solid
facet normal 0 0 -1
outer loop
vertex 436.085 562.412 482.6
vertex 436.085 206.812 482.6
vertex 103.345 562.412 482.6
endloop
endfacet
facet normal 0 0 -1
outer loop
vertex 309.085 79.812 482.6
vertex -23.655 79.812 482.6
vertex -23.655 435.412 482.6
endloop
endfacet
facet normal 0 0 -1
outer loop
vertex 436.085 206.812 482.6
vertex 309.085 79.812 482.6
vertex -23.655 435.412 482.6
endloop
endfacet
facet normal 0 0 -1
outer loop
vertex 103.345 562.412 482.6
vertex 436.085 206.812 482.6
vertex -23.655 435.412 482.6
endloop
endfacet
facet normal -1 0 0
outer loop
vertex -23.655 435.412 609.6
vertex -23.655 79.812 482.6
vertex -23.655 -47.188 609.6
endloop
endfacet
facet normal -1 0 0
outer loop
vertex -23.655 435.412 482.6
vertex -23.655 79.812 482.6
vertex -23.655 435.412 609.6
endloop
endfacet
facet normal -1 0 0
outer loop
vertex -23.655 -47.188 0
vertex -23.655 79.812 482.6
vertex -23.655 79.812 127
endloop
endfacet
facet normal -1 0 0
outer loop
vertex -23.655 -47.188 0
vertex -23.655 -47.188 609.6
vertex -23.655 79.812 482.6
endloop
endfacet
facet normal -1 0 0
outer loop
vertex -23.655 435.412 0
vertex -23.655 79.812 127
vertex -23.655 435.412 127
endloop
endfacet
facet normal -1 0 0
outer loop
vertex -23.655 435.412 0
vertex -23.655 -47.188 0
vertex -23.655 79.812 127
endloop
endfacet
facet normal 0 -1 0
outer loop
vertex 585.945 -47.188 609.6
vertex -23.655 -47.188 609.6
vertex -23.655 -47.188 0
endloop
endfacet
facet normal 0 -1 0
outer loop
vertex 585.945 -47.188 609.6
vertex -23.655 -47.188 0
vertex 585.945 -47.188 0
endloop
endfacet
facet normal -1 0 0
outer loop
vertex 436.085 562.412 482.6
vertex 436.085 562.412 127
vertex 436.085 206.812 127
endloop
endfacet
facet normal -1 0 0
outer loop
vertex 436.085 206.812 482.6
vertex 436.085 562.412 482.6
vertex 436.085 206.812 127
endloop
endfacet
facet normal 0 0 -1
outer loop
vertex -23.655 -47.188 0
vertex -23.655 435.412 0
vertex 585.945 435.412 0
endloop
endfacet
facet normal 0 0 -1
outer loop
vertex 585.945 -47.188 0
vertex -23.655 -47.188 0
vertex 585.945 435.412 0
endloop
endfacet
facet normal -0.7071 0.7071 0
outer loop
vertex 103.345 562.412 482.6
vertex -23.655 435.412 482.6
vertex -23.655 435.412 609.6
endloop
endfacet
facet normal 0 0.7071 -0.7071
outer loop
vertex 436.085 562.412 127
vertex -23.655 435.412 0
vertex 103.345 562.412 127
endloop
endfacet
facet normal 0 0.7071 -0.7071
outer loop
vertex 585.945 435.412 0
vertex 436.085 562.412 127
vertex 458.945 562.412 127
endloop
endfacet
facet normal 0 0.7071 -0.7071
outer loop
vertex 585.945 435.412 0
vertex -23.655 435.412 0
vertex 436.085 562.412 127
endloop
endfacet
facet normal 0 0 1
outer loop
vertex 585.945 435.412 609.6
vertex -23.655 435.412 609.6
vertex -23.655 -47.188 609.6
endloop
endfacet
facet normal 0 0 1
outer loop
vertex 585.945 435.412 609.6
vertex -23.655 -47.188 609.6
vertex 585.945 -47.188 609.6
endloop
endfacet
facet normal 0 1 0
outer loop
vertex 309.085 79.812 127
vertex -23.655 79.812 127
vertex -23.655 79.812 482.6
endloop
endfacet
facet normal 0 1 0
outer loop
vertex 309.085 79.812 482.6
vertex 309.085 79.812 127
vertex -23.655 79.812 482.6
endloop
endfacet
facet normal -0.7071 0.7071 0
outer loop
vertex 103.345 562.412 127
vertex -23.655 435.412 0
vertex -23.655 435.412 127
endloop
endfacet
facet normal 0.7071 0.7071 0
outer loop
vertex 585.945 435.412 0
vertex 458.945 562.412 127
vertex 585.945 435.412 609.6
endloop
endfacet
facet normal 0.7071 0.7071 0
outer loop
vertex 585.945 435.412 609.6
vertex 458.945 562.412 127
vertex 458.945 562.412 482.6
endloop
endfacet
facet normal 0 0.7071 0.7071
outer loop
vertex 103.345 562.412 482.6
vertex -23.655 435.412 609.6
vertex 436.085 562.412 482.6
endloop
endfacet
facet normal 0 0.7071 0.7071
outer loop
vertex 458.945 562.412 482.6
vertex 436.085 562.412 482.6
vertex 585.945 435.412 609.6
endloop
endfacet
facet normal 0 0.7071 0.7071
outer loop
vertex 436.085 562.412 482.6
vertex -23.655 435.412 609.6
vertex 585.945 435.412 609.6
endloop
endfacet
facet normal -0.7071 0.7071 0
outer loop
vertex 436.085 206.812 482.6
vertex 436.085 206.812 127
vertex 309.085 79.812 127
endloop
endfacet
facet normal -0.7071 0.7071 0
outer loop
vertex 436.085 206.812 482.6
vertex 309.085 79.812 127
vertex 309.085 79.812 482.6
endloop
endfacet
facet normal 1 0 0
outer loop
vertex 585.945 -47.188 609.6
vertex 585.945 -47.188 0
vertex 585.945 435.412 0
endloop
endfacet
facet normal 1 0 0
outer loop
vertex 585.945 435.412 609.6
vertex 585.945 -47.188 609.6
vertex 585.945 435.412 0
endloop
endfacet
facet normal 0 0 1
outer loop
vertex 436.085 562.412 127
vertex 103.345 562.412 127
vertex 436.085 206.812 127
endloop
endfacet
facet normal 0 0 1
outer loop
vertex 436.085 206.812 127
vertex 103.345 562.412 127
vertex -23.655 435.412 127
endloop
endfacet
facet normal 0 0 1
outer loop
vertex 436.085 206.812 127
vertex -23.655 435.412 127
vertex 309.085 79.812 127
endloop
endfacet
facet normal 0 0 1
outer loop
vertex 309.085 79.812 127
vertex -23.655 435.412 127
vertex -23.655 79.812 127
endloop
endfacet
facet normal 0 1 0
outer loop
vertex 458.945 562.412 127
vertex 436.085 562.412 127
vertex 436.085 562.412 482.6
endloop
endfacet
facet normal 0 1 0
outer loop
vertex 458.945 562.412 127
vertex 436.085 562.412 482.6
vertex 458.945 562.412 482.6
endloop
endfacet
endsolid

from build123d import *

# Parameters (mm, degrees)
F0_W     = 609.6
F0_H     = 609.6
F1_DEPTH = 609.6
F2_SIZE  = 127
F3_W     = 228.6
F3_H     = 355.6
F3_W_2   = 127
F3_W_3   = 351.28561
F4_DEPTH = 459.74
F5_SIZE  = 127


with BuildPart() as f1:
    # F0 (on Top) → F1 (new body)
    with BuildSketch(Plane.XY):
        with Locations((281.144673, 257.611539)):
            Rectangle(F0_W, F0_H)
    extrude(amount=F1_DEPTH)

    # F2
    f2_edges = [f1.edges().sort_by_distance(p)[0] for p in [
        (585.944673, 562.411539, 304.8),
        (-23.655327, 562.411539, 304.8),
        (281.144673, 562.411539, 0),
        (281.144673, 562.411539, 609.6),
    ]]
    chamfer(f2_edges, length=F2_SIZE)

    # F3 (on face) → F4 (cut)
    with BuildSketch(Plane(origin=(-23.655327, 0, 0), x_dir=(0, -1, 0), z_dir=(-1, 0, 0))):
        with Locations((-194.111539, 304.8)):
            Rectangle(F3_W, F3_H)
        with Locations((-371.911539, 304.8)):
            Rectangle(F3_W_2, F3_H)
        with Locations((-611.054344, 304.8)):
            Rectangle(F3_W_3, F3_H)
    extrude(amount=-F4_DEPTH, mode=Mode.SUBTRACT)

    # F5
    f5_edges = [f1.edges().sort_by_distance(p)[0] for p in [
        (436.084673, 79.811539, 304.8),
    ]]
    chamfer(f5_edges, length=F5_SIZE)


solid = f1.part
